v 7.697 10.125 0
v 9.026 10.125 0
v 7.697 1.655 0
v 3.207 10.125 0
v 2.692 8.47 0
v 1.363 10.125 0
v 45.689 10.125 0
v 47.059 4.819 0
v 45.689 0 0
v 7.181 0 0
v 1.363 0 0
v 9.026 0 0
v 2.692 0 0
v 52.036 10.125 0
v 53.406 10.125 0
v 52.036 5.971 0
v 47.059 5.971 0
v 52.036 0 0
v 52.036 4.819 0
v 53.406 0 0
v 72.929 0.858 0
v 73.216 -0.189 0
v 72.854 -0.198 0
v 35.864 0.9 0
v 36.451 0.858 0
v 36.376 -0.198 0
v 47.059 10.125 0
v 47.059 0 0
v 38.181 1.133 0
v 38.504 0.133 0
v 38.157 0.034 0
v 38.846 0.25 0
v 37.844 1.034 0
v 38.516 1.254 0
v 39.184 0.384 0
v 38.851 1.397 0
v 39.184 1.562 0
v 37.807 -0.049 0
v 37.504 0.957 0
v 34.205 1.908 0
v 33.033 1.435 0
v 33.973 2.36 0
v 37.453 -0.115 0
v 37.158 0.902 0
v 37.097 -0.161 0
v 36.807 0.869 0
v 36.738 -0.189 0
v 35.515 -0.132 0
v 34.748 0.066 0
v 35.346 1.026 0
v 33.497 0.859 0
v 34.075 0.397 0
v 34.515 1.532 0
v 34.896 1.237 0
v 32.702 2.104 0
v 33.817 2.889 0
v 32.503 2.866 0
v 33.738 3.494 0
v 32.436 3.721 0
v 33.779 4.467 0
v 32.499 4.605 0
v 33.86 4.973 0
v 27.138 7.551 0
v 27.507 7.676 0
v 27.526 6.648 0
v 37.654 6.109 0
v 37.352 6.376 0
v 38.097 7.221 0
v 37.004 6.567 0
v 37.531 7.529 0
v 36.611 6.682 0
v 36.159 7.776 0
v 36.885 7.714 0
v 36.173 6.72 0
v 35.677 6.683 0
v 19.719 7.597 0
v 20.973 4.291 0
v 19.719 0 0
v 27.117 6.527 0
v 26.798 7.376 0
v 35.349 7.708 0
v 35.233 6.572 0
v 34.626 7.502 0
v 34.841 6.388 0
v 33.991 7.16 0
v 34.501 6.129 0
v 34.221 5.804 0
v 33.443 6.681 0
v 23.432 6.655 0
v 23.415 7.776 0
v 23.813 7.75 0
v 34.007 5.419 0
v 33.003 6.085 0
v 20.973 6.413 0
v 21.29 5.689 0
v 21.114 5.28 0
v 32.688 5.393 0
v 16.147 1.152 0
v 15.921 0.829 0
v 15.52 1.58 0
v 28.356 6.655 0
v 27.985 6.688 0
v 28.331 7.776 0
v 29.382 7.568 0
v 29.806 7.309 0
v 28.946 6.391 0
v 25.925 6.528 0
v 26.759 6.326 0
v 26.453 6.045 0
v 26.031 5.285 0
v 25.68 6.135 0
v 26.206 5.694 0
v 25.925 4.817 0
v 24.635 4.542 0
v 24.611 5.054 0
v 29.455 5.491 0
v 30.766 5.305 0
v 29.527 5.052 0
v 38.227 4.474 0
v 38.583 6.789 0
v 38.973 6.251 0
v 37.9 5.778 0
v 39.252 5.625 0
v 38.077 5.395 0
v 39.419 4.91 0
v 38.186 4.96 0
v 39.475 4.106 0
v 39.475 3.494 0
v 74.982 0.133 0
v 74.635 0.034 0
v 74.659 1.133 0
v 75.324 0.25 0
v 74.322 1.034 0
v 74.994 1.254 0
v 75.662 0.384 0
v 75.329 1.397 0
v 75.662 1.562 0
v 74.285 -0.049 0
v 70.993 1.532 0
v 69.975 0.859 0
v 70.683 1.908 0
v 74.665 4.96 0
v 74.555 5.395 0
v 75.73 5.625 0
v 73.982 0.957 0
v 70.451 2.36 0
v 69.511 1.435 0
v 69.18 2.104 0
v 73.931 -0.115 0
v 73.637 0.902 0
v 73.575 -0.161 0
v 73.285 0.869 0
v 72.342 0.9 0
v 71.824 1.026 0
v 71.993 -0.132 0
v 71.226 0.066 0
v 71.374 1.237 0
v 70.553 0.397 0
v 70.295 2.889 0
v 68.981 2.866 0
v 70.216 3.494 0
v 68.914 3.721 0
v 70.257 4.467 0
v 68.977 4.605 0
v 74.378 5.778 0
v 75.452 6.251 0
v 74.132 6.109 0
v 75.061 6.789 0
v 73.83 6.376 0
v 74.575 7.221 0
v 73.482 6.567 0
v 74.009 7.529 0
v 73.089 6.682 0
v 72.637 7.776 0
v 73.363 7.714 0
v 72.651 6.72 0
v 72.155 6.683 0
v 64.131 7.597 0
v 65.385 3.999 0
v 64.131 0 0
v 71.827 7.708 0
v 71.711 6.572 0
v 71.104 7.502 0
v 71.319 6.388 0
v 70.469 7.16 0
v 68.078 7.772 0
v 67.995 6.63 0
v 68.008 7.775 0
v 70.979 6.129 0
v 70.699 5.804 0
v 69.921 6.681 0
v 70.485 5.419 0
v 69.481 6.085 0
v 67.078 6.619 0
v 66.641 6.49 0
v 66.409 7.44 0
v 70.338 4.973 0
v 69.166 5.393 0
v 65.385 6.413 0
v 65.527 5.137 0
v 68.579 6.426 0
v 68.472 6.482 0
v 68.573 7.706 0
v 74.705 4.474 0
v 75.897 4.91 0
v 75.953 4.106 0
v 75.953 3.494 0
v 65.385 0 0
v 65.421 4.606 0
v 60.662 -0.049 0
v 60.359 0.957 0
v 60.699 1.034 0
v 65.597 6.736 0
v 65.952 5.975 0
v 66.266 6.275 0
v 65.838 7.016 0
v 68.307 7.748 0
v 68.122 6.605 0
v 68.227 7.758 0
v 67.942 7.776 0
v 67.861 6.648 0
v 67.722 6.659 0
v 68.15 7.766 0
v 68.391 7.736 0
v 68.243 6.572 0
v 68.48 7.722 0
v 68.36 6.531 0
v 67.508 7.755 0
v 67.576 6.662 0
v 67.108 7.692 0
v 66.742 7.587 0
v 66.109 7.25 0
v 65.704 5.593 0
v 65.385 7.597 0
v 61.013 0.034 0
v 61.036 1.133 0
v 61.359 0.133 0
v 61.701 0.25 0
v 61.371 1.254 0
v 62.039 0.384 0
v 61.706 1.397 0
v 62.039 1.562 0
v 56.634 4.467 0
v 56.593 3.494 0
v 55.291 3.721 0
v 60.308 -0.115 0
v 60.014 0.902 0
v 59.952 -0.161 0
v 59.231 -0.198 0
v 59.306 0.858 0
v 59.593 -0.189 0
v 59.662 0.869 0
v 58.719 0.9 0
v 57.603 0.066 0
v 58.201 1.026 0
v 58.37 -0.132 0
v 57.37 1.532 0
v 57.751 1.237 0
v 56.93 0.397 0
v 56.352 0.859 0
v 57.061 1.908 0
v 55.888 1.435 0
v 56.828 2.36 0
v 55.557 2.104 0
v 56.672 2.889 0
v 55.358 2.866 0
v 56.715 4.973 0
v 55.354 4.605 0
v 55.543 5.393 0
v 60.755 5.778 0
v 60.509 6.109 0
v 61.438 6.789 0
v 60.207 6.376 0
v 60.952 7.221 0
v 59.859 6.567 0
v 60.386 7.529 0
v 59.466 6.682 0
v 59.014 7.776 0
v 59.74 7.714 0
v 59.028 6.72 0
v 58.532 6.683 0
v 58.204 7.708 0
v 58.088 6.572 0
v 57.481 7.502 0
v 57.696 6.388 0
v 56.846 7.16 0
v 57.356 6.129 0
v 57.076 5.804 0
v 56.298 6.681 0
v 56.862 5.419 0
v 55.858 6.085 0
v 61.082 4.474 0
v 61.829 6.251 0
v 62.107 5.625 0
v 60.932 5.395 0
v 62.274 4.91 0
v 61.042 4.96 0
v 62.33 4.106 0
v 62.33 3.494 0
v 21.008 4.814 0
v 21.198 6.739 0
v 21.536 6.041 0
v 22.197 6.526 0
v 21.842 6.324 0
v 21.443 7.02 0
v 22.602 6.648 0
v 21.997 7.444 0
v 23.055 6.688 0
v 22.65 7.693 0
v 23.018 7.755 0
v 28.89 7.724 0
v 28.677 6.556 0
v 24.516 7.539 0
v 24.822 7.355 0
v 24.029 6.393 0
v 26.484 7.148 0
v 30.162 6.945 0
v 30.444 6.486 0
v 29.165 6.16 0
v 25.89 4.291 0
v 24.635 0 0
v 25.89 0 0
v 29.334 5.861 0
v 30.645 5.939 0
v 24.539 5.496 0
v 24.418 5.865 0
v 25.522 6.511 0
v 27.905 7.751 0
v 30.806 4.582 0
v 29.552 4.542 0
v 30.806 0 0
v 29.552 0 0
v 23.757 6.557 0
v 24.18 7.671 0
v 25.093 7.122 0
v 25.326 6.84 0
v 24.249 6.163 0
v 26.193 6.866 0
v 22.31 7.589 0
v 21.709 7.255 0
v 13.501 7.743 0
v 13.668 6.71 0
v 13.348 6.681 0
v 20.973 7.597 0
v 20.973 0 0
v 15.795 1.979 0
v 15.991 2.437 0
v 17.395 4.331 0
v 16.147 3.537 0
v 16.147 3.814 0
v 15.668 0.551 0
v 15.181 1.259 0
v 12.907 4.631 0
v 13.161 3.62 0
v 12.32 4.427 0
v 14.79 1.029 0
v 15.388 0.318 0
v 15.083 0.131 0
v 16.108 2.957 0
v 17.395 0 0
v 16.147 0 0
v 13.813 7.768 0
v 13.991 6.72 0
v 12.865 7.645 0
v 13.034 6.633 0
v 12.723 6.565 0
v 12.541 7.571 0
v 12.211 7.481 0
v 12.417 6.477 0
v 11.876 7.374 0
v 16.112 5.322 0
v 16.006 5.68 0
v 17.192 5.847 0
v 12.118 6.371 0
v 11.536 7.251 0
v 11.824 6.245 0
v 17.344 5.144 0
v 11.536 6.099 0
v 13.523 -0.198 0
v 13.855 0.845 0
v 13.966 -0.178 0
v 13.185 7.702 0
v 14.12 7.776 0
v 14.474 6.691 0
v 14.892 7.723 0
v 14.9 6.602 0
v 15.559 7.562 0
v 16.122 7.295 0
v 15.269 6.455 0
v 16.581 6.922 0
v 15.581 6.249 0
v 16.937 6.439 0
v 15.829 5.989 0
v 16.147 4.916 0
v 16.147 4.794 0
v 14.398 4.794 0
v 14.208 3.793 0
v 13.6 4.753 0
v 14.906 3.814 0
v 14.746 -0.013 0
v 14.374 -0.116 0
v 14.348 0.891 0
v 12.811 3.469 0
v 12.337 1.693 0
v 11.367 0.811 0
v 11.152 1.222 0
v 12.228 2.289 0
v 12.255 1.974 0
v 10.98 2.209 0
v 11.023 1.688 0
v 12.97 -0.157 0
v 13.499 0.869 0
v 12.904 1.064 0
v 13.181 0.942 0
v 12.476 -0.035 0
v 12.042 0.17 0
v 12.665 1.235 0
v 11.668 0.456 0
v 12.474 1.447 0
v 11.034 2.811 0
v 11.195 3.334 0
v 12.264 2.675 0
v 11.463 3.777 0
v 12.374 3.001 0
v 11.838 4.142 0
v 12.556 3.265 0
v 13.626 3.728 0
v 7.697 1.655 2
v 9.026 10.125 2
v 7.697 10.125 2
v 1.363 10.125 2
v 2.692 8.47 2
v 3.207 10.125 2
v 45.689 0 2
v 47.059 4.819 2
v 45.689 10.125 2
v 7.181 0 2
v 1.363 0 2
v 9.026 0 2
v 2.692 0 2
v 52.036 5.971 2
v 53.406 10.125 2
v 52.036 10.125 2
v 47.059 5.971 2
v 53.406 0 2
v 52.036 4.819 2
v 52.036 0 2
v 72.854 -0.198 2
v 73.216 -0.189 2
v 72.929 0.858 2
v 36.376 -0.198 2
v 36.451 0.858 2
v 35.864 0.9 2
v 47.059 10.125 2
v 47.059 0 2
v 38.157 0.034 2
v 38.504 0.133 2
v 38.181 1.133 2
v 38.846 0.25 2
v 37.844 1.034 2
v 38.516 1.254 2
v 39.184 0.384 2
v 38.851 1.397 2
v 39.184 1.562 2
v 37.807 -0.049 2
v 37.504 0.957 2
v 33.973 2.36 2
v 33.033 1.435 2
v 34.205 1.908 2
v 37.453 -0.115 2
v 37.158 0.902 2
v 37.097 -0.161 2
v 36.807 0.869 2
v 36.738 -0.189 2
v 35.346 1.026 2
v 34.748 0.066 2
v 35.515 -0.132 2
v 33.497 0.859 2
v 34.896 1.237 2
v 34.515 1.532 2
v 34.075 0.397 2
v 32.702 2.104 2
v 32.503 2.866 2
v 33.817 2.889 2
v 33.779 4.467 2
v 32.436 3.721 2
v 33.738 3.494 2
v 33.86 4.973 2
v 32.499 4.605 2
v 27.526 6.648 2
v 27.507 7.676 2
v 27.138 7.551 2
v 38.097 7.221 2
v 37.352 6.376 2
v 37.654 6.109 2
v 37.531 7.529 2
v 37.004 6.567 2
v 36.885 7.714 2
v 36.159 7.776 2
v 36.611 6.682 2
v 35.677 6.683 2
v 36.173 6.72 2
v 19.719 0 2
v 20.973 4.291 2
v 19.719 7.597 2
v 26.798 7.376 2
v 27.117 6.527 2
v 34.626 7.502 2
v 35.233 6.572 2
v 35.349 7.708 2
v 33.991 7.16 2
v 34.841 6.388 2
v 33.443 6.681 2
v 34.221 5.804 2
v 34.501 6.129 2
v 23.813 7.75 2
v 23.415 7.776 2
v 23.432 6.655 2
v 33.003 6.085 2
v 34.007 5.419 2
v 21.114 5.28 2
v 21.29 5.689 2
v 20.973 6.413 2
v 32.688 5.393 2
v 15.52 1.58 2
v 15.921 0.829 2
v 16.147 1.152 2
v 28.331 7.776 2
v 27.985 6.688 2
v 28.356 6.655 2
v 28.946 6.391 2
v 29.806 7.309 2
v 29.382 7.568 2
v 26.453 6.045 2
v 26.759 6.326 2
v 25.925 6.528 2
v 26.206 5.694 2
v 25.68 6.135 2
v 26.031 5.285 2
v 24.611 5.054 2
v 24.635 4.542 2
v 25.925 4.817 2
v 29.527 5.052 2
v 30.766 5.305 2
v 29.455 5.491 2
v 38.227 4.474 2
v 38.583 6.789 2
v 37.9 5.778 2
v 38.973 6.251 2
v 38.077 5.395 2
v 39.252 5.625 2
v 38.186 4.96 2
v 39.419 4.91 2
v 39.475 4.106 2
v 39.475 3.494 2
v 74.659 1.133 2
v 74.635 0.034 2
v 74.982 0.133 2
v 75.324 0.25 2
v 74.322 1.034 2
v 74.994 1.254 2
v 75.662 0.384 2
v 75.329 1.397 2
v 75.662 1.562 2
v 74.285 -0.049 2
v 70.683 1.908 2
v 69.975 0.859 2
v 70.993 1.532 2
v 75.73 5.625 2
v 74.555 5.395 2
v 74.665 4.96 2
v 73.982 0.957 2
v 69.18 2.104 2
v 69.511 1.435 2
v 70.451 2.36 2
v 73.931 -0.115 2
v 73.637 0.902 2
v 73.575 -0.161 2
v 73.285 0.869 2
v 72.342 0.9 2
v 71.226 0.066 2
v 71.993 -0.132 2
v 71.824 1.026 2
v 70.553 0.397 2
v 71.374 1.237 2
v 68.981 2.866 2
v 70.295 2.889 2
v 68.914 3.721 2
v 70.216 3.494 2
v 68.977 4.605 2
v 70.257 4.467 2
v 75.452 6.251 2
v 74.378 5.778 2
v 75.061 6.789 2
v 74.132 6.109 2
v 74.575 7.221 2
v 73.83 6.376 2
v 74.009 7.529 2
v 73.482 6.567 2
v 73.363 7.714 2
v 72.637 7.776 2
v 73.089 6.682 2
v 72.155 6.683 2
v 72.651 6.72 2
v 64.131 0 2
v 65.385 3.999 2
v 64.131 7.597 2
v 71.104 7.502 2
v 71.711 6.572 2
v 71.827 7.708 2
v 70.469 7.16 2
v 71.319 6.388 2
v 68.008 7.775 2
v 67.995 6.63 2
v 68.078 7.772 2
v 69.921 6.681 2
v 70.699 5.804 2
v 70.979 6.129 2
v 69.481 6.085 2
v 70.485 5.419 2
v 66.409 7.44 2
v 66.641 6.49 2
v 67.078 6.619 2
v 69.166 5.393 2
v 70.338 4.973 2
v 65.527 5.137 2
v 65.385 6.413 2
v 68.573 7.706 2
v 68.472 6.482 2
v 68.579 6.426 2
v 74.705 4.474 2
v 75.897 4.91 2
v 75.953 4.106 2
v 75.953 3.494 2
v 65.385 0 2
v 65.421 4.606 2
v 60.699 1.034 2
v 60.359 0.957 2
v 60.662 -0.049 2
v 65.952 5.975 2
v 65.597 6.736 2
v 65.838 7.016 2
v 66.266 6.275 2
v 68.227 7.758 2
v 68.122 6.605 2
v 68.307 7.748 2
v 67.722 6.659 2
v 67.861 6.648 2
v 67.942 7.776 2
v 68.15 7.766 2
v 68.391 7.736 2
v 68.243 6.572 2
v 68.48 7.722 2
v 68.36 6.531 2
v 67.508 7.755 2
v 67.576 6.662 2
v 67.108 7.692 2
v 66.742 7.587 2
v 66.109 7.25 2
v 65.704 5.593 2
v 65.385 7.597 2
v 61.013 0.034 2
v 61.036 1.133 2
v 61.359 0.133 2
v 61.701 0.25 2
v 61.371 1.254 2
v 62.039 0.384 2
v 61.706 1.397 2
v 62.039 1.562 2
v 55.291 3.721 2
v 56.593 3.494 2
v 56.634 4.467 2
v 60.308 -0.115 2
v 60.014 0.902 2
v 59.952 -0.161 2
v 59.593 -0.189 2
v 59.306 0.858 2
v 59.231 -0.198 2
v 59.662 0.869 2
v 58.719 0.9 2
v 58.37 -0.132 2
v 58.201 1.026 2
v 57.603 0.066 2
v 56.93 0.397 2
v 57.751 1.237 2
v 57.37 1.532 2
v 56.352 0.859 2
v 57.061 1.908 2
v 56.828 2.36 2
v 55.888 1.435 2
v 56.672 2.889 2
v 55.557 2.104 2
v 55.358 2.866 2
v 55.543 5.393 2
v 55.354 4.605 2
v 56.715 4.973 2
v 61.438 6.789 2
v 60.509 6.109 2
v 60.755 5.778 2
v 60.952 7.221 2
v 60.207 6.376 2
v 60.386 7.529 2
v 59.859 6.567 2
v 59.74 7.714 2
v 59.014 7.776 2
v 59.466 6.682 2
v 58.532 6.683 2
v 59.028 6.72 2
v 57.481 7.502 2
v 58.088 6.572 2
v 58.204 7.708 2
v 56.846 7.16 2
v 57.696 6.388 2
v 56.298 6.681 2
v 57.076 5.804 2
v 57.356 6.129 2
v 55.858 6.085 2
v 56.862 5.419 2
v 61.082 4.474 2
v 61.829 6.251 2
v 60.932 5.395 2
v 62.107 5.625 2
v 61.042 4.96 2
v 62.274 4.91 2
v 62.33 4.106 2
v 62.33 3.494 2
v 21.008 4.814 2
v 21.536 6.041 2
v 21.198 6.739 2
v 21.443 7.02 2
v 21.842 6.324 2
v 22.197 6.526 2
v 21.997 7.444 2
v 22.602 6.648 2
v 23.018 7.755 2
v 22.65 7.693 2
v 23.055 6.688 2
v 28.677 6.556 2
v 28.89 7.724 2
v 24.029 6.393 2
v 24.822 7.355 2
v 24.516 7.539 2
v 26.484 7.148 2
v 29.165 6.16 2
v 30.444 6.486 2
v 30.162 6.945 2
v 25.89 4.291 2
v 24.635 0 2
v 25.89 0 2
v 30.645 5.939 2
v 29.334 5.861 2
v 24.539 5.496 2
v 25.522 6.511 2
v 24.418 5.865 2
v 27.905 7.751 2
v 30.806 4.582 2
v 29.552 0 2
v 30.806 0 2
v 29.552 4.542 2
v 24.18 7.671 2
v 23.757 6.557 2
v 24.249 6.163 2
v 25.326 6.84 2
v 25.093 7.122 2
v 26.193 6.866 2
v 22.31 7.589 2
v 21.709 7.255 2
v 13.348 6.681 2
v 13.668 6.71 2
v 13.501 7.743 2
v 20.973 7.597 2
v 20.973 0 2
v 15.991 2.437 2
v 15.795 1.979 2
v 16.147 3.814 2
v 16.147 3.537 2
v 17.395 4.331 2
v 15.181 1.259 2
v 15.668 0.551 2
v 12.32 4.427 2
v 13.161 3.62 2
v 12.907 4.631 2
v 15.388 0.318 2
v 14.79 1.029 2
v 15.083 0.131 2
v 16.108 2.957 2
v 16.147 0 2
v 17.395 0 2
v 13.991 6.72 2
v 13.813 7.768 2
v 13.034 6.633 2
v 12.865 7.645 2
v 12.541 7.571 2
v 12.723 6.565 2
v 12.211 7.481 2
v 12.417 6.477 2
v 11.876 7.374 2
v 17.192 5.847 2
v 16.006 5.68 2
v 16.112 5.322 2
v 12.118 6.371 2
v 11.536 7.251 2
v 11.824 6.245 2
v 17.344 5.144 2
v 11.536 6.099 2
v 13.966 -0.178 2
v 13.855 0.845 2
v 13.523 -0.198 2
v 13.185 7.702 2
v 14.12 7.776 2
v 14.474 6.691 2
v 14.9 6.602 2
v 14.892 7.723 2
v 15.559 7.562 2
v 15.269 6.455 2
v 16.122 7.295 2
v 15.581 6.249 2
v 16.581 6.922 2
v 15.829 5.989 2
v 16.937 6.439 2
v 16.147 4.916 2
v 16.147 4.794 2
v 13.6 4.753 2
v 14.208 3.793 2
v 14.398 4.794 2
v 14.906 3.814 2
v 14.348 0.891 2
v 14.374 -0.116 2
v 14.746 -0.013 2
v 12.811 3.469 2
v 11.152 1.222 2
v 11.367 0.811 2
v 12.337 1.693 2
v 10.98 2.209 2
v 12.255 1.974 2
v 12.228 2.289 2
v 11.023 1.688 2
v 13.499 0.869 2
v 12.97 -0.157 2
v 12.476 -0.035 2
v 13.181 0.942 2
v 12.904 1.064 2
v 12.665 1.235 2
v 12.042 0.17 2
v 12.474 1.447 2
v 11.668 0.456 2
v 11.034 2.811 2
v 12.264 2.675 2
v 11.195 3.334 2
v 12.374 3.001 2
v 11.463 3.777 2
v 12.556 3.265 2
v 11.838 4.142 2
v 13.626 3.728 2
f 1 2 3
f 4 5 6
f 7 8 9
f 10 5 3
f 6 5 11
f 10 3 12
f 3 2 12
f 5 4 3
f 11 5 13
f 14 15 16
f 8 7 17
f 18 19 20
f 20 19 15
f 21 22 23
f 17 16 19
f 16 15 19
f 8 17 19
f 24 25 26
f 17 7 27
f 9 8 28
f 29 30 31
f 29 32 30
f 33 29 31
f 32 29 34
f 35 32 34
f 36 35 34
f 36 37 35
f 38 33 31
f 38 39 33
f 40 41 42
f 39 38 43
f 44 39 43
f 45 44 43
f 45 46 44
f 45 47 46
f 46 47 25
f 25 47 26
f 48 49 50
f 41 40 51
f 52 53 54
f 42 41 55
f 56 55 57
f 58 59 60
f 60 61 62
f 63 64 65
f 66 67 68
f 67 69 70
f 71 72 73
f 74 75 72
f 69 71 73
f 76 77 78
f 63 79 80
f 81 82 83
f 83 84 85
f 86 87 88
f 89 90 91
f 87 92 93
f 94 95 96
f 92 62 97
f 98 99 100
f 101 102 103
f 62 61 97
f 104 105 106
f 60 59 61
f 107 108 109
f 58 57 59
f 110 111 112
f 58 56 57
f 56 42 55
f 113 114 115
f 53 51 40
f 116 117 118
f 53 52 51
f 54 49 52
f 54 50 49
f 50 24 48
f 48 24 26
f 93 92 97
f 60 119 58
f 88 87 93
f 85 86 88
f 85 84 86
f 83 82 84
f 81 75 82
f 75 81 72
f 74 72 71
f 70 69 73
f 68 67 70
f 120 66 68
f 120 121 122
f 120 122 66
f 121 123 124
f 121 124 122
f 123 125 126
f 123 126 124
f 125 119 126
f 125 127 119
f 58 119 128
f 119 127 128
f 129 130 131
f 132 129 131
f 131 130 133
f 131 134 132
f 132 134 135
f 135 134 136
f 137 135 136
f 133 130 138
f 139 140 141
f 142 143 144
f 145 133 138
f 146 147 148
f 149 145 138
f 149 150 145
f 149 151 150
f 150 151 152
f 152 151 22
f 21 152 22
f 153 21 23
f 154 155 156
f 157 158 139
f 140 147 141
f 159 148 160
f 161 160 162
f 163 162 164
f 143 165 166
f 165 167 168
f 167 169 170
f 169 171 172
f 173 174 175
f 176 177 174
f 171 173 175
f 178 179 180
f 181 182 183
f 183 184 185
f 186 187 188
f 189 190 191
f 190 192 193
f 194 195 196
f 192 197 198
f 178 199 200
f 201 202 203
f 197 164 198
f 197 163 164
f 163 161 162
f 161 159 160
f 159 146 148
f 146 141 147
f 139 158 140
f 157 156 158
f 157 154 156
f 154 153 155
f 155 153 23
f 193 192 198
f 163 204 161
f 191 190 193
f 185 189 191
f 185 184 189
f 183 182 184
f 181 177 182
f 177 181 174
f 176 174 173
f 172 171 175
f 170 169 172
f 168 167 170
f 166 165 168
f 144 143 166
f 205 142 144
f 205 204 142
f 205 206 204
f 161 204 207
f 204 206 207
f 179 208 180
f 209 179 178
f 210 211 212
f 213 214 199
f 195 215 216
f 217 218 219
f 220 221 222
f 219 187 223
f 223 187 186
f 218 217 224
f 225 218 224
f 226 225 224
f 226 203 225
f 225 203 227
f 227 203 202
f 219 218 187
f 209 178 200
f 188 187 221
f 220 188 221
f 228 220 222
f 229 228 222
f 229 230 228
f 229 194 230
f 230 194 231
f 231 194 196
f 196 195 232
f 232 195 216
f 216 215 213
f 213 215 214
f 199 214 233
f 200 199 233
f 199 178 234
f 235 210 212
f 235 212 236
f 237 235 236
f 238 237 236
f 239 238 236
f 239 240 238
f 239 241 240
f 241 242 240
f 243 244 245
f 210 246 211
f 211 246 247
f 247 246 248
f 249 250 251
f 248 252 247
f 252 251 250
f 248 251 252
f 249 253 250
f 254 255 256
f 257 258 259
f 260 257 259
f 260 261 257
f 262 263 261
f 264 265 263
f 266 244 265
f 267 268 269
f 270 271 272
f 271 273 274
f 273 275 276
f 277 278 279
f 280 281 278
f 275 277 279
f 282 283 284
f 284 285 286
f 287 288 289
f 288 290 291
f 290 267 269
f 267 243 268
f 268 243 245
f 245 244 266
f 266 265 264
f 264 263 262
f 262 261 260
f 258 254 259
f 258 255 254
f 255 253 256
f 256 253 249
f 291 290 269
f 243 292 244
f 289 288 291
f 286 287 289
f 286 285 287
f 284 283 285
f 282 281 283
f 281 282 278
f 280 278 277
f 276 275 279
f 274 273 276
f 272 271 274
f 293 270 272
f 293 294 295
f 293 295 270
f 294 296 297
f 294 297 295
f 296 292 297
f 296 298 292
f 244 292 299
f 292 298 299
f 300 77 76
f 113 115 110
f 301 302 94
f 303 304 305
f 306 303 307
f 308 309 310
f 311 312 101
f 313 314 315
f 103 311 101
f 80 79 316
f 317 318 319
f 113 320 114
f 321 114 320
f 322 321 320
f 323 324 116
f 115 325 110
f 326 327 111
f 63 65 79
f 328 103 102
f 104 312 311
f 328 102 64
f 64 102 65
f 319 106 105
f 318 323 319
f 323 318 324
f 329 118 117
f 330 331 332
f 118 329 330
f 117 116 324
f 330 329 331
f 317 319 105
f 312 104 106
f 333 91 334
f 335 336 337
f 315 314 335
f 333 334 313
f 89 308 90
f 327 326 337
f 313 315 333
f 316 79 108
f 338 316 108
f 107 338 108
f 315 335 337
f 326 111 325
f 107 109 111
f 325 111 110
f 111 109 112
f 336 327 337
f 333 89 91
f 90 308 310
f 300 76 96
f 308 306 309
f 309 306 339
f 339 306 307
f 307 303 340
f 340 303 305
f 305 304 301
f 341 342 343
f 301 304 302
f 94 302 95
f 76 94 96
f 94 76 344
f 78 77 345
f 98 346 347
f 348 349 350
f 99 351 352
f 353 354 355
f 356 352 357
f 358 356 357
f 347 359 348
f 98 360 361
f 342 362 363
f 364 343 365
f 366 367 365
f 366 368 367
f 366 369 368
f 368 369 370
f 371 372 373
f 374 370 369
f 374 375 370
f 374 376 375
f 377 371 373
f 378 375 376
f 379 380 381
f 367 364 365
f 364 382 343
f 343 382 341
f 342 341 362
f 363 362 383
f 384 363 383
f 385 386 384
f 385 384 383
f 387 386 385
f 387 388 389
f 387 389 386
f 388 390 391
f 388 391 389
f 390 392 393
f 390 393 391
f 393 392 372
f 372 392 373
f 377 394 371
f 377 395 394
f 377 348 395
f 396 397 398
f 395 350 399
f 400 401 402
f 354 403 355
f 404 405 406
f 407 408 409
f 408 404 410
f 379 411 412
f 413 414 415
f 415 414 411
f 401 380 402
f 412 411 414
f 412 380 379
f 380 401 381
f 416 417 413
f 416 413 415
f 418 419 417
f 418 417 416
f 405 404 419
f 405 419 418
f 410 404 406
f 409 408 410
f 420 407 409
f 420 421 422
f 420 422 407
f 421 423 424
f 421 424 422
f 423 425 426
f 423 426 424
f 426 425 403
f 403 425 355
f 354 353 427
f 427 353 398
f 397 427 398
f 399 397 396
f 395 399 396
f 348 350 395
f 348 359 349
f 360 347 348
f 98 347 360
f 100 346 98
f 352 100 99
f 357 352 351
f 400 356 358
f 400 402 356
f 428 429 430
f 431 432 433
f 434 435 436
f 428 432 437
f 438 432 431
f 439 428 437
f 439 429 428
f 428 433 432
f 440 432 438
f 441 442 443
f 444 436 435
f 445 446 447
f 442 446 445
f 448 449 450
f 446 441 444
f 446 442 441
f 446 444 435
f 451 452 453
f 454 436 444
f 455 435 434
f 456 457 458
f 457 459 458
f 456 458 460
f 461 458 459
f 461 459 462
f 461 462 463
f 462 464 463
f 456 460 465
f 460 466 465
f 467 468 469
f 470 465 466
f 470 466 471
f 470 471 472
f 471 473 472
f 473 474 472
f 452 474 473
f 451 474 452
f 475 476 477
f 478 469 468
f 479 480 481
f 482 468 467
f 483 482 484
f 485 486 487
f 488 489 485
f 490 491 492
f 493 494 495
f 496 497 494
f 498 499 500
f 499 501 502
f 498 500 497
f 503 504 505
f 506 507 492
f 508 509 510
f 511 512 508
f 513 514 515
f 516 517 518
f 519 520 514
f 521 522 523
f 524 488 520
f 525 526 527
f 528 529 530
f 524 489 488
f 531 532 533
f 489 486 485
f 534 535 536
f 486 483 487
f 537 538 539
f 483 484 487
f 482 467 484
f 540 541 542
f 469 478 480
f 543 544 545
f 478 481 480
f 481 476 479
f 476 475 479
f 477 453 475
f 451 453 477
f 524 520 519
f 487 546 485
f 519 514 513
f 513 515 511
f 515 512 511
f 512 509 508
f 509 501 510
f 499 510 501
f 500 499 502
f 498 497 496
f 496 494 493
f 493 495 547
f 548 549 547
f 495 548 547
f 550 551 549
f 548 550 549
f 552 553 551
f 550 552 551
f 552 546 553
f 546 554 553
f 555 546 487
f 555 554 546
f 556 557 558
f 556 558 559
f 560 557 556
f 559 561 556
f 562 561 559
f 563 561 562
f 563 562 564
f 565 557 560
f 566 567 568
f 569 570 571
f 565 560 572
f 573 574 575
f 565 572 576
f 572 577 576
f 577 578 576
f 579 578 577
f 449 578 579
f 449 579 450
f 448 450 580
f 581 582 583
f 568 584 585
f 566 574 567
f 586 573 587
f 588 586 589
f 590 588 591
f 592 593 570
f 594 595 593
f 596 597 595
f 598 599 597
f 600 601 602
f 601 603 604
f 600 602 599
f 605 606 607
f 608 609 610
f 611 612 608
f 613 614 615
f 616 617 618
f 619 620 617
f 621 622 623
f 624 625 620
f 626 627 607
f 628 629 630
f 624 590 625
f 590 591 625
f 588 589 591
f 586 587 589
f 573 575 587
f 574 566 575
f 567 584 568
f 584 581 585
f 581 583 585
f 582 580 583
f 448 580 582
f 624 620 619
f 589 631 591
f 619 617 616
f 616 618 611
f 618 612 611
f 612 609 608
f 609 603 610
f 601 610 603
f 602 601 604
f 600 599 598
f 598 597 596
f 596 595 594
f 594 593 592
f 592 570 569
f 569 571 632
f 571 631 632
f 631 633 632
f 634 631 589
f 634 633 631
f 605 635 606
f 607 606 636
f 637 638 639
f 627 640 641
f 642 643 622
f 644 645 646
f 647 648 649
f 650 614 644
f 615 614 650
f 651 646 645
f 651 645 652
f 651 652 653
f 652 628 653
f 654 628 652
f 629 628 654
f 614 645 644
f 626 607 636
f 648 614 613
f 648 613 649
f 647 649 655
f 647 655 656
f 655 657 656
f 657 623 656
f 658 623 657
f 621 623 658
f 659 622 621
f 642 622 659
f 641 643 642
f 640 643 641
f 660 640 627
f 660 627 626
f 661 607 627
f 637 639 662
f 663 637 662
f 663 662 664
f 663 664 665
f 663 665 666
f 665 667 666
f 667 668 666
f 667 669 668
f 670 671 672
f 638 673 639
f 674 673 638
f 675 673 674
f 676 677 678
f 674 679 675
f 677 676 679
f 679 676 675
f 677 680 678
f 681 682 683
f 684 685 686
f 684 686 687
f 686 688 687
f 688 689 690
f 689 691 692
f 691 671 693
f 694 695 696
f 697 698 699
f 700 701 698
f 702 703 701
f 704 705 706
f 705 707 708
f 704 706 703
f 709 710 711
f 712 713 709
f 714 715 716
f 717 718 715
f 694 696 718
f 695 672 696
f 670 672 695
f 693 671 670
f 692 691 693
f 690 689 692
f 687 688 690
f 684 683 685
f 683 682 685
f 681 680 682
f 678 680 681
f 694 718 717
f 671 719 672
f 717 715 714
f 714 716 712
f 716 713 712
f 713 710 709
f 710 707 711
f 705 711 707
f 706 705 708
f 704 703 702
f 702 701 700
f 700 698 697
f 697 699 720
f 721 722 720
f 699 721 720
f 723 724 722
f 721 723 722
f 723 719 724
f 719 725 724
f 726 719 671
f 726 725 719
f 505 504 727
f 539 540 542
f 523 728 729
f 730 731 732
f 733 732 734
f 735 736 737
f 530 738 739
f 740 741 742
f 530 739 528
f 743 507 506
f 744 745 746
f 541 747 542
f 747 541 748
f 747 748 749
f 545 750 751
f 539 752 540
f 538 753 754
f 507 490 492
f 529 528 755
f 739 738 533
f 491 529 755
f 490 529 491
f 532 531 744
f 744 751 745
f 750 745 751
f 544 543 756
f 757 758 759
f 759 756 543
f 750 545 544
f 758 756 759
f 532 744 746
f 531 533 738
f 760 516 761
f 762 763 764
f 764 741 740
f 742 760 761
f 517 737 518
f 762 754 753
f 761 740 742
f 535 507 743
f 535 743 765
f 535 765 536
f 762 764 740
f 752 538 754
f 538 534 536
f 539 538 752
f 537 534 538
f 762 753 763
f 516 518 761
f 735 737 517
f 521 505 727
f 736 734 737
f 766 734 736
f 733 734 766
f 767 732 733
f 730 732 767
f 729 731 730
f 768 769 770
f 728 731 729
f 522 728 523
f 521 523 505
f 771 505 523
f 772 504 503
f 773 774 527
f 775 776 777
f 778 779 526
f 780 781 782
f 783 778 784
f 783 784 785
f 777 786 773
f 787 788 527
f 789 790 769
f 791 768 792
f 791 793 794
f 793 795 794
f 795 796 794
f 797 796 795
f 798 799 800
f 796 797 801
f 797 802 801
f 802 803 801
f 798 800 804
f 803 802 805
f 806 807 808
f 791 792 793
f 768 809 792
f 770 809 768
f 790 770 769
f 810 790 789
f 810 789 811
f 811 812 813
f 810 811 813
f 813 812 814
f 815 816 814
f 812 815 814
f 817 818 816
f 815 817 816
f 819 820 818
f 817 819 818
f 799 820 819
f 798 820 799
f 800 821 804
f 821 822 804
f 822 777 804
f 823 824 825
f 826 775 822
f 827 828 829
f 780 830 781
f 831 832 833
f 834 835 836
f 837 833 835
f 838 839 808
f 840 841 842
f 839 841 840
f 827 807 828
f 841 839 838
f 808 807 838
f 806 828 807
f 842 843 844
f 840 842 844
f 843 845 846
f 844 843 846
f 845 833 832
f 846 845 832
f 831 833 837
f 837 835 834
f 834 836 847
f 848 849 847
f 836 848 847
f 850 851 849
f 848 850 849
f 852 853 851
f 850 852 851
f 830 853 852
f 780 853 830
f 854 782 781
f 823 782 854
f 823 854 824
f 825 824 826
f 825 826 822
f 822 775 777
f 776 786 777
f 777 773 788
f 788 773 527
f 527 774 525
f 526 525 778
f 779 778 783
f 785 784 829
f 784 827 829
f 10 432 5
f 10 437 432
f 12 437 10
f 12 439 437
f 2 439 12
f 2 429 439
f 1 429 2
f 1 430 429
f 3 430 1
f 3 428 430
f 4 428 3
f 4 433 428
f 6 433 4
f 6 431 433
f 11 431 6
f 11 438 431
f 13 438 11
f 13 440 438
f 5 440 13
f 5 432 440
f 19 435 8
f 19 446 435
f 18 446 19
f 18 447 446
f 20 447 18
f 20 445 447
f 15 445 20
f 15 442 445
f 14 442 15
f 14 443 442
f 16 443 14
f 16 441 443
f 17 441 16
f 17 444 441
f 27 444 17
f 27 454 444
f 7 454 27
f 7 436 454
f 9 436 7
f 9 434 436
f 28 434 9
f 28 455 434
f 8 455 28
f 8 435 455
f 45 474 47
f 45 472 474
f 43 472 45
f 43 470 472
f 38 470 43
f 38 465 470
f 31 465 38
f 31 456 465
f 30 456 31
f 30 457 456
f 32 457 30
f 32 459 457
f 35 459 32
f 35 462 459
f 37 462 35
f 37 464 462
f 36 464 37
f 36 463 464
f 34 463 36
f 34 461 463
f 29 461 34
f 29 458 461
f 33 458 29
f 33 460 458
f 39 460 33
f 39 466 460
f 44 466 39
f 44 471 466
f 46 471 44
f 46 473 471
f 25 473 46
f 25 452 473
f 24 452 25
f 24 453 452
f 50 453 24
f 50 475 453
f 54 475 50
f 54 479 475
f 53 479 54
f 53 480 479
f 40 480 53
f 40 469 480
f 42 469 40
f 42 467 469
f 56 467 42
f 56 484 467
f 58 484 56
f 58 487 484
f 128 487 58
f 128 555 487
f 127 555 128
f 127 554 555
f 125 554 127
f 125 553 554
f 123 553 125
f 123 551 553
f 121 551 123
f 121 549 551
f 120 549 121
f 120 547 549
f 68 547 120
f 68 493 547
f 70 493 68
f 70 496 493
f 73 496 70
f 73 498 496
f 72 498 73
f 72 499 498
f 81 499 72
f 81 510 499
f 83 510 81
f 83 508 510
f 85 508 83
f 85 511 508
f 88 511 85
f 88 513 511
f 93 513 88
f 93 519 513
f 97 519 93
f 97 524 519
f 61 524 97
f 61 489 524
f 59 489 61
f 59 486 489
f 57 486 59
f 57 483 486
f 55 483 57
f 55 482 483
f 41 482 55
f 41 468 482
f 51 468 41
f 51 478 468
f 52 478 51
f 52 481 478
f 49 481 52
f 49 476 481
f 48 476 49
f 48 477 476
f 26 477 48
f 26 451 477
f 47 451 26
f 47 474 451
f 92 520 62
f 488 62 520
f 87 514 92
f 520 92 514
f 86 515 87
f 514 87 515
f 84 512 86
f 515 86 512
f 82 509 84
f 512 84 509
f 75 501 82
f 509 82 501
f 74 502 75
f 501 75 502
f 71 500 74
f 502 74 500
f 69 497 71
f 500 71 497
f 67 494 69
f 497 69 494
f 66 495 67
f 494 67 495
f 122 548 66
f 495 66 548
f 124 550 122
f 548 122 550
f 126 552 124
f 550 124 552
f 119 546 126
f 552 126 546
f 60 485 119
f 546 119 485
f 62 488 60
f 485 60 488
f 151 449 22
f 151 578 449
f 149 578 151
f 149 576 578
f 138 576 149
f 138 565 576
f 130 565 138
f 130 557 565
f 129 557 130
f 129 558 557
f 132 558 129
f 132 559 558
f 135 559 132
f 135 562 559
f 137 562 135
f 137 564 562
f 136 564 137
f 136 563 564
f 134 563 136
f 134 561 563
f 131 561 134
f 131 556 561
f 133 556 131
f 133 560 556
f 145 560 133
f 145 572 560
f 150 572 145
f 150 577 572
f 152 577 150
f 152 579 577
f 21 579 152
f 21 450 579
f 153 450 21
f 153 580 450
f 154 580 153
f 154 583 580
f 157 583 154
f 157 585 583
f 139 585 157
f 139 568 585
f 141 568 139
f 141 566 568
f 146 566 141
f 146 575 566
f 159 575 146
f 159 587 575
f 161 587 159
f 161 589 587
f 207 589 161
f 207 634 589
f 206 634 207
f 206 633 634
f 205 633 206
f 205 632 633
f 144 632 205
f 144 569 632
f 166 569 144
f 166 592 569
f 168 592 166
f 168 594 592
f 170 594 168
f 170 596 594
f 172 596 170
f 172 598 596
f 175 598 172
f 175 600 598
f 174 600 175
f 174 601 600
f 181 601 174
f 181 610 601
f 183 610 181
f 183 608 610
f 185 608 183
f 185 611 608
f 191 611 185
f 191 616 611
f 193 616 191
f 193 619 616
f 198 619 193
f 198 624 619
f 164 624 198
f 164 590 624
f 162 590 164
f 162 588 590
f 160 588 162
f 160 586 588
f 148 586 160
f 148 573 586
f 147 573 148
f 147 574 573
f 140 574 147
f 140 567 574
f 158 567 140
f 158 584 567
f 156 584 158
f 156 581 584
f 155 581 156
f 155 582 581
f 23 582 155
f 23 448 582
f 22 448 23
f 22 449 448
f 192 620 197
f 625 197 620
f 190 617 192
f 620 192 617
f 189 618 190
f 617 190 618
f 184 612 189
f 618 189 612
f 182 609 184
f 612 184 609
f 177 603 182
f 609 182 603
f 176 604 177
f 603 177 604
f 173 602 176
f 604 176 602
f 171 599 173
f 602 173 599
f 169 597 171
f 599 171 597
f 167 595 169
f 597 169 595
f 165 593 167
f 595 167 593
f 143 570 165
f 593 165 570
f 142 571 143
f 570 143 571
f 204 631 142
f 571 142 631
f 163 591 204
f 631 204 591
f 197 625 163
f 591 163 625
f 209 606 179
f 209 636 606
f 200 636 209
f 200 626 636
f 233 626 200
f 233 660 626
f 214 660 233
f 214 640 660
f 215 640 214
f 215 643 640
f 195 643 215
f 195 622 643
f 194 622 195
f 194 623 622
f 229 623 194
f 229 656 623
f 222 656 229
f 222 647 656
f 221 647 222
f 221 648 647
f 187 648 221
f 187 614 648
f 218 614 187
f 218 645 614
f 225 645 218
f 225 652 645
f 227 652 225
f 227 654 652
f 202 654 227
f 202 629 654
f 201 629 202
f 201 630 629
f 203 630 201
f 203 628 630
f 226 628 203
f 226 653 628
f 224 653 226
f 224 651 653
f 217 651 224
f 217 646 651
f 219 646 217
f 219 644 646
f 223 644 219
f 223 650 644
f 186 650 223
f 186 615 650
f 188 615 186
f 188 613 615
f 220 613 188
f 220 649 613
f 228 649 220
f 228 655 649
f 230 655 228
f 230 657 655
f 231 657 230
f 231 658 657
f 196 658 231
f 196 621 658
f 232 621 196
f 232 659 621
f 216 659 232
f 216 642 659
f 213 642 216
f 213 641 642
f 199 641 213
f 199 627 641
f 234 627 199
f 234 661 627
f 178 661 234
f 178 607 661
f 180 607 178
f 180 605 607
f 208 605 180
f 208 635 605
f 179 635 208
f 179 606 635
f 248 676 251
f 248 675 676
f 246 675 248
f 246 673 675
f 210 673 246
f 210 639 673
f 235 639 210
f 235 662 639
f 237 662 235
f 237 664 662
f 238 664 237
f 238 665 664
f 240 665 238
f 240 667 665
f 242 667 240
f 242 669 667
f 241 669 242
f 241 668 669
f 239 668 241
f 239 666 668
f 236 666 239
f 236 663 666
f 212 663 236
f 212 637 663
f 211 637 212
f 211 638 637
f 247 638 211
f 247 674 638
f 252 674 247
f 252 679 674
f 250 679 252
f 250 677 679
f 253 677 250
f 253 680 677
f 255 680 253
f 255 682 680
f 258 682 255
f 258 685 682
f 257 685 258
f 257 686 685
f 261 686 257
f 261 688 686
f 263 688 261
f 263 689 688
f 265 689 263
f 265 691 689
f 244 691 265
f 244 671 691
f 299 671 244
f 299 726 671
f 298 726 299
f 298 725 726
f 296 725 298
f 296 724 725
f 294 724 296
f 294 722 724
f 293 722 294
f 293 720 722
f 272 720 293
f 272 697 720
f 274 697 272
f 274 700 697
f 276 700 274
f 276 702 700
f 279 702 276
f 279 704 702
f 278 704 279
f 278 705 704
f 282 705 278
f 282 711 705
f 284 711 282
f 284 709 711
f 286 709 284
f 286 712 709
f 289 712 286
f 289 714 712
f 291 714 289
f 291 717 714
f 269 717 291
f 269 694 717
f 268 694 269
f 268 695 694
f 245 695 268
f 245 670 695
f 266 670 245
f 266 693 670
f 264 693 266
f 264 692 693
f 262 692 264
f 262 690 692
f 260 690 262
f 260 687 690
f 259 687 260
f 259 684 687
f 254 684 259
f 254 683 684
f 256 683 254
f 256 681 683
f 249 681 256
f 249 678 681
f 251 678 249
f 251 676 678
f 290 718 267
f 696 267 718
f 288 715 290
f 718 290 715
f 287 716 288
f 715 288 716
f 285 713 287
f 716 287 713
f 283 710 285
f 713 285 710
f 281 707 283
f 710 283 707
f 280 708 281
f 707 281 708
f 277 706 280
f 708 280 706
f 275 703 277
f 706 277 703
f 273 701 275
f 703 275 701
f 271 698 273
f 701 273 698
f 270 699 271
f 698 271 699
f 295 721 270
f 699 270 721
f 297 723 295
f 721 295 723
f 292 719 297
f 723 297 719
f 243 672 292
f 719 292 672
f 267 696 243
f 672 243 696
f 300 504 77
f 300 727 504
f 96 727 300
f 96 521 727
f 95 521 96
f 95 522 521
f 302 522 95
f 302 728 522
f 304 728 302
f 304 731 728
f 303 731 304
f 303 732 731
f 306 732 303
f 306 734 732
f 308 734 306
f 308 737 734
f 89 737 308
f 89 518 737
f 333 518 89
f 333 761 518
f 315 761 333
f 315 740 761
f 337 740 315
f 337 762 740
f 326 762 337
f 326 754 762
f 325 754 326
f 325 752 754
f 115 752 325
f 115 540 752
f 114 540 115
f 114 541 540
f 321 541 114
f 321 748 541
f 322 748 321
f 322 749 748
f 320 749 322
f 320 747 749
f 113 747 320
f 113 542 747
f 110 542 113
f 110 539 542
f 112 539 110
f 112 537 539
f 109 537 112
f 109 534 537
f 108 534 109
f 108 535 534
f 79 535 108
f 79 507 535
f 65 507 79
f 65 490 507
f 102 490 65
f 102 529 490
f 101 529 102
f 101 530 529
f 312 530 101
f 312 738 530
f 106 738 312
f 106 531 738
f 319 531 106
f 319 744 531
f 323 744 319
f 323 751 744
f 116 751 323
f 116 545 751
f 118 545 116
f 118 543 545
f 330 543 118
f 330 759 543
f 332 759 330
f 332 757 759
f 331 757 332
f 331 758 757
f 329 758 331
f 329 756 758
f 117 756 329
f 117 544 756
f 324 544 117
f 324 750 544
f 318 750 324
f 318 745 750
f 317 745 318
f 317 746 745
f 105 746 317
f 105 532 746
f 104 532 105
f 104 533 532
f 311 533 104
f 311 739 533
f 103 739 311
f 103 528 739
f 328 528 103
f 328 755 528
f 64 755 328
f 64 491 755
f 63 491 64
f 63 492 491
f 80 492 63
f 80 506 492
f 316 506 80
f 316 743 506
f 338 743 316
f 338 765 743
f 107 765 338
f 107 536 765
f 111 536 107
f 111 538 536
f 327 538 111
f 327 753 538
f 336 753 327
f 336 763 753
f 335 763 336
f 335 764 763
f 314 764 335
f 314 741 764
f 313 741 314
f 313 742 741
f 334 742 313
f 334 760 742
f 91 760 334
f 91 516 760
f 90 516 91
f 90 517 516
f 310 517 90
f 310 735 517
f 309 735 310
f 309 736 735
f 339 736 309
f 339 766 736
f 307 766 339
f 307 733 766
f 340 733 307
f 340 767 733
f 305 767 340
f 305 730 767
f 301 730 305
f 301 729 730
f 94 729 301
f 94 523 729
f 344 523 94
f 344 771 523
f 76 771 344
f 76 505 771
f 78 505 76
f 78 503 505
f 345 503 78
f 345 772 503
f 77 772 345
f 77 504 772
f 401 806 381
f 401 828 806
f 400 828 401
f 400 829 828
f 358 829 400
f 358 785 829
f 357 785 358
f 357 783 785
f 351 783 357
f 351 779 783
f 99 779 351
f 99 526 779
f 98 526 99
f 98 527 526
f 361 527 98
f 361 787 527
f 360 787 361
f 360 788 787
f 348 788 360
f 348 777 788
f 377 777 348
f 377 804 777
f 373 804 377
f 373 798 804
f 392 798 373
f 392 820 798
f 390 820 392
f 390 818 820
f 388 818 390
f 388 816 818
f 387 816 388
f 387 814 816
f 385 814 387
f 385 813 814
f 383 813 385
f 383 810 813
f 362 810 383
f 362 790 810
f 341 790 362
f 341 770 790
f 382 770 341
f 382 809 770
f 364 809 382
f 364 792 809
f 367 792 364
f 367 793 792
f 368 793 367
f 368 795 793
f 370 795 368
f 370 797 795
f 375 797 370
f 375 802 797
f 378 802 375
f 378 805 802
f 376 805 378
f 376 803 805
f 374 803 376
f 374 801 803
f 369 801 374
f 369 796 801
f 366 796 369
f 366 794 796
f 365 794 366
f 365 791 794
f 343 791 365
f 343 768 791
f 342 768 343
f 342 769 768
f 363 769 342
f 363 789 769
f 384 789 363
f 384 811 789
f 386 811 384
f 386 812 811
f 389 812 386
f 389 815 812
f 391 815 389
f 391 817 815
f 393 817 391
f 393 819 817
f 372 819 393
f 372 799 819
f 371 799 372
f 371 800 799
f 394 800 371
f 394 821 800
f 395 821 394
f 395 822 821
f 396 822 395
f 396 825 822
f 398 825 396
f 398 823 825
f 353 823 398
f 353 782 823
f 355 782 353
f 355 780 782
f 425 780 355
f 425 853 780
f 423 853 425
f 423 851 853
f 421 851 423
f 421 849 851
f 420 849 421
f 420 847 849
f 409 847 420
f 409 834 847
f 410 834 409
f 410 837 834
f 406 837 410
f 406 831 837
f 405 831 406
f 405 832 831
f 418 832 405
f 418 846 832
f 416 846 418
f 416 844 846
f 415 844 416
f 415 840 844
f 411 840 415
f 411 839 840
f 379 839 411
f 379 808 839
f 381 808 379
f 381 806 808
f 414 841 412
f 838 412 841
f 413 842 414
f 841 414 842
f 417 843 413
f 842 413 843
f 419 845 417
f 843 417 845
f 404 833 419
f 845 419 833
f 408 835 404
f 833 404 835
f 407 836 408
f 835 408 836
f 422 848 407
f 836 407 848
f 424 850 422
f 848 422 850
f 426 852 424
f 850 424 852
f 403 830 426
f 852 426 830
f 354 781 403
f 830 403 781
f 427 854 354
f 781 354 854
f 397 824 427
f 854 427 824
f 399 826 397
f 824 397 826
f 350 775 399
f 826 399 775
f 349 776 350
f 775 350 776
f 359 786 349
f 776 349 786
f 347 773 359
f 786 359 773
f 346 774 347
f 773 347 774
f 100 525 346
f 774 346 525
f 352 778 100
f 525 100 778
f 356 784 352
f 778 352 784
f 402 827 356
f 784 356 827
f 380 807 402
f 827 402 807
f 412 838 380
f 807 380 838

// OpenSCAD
linear_extrude(2){
    text("Name Here", font="DejaVu Sans");
}
